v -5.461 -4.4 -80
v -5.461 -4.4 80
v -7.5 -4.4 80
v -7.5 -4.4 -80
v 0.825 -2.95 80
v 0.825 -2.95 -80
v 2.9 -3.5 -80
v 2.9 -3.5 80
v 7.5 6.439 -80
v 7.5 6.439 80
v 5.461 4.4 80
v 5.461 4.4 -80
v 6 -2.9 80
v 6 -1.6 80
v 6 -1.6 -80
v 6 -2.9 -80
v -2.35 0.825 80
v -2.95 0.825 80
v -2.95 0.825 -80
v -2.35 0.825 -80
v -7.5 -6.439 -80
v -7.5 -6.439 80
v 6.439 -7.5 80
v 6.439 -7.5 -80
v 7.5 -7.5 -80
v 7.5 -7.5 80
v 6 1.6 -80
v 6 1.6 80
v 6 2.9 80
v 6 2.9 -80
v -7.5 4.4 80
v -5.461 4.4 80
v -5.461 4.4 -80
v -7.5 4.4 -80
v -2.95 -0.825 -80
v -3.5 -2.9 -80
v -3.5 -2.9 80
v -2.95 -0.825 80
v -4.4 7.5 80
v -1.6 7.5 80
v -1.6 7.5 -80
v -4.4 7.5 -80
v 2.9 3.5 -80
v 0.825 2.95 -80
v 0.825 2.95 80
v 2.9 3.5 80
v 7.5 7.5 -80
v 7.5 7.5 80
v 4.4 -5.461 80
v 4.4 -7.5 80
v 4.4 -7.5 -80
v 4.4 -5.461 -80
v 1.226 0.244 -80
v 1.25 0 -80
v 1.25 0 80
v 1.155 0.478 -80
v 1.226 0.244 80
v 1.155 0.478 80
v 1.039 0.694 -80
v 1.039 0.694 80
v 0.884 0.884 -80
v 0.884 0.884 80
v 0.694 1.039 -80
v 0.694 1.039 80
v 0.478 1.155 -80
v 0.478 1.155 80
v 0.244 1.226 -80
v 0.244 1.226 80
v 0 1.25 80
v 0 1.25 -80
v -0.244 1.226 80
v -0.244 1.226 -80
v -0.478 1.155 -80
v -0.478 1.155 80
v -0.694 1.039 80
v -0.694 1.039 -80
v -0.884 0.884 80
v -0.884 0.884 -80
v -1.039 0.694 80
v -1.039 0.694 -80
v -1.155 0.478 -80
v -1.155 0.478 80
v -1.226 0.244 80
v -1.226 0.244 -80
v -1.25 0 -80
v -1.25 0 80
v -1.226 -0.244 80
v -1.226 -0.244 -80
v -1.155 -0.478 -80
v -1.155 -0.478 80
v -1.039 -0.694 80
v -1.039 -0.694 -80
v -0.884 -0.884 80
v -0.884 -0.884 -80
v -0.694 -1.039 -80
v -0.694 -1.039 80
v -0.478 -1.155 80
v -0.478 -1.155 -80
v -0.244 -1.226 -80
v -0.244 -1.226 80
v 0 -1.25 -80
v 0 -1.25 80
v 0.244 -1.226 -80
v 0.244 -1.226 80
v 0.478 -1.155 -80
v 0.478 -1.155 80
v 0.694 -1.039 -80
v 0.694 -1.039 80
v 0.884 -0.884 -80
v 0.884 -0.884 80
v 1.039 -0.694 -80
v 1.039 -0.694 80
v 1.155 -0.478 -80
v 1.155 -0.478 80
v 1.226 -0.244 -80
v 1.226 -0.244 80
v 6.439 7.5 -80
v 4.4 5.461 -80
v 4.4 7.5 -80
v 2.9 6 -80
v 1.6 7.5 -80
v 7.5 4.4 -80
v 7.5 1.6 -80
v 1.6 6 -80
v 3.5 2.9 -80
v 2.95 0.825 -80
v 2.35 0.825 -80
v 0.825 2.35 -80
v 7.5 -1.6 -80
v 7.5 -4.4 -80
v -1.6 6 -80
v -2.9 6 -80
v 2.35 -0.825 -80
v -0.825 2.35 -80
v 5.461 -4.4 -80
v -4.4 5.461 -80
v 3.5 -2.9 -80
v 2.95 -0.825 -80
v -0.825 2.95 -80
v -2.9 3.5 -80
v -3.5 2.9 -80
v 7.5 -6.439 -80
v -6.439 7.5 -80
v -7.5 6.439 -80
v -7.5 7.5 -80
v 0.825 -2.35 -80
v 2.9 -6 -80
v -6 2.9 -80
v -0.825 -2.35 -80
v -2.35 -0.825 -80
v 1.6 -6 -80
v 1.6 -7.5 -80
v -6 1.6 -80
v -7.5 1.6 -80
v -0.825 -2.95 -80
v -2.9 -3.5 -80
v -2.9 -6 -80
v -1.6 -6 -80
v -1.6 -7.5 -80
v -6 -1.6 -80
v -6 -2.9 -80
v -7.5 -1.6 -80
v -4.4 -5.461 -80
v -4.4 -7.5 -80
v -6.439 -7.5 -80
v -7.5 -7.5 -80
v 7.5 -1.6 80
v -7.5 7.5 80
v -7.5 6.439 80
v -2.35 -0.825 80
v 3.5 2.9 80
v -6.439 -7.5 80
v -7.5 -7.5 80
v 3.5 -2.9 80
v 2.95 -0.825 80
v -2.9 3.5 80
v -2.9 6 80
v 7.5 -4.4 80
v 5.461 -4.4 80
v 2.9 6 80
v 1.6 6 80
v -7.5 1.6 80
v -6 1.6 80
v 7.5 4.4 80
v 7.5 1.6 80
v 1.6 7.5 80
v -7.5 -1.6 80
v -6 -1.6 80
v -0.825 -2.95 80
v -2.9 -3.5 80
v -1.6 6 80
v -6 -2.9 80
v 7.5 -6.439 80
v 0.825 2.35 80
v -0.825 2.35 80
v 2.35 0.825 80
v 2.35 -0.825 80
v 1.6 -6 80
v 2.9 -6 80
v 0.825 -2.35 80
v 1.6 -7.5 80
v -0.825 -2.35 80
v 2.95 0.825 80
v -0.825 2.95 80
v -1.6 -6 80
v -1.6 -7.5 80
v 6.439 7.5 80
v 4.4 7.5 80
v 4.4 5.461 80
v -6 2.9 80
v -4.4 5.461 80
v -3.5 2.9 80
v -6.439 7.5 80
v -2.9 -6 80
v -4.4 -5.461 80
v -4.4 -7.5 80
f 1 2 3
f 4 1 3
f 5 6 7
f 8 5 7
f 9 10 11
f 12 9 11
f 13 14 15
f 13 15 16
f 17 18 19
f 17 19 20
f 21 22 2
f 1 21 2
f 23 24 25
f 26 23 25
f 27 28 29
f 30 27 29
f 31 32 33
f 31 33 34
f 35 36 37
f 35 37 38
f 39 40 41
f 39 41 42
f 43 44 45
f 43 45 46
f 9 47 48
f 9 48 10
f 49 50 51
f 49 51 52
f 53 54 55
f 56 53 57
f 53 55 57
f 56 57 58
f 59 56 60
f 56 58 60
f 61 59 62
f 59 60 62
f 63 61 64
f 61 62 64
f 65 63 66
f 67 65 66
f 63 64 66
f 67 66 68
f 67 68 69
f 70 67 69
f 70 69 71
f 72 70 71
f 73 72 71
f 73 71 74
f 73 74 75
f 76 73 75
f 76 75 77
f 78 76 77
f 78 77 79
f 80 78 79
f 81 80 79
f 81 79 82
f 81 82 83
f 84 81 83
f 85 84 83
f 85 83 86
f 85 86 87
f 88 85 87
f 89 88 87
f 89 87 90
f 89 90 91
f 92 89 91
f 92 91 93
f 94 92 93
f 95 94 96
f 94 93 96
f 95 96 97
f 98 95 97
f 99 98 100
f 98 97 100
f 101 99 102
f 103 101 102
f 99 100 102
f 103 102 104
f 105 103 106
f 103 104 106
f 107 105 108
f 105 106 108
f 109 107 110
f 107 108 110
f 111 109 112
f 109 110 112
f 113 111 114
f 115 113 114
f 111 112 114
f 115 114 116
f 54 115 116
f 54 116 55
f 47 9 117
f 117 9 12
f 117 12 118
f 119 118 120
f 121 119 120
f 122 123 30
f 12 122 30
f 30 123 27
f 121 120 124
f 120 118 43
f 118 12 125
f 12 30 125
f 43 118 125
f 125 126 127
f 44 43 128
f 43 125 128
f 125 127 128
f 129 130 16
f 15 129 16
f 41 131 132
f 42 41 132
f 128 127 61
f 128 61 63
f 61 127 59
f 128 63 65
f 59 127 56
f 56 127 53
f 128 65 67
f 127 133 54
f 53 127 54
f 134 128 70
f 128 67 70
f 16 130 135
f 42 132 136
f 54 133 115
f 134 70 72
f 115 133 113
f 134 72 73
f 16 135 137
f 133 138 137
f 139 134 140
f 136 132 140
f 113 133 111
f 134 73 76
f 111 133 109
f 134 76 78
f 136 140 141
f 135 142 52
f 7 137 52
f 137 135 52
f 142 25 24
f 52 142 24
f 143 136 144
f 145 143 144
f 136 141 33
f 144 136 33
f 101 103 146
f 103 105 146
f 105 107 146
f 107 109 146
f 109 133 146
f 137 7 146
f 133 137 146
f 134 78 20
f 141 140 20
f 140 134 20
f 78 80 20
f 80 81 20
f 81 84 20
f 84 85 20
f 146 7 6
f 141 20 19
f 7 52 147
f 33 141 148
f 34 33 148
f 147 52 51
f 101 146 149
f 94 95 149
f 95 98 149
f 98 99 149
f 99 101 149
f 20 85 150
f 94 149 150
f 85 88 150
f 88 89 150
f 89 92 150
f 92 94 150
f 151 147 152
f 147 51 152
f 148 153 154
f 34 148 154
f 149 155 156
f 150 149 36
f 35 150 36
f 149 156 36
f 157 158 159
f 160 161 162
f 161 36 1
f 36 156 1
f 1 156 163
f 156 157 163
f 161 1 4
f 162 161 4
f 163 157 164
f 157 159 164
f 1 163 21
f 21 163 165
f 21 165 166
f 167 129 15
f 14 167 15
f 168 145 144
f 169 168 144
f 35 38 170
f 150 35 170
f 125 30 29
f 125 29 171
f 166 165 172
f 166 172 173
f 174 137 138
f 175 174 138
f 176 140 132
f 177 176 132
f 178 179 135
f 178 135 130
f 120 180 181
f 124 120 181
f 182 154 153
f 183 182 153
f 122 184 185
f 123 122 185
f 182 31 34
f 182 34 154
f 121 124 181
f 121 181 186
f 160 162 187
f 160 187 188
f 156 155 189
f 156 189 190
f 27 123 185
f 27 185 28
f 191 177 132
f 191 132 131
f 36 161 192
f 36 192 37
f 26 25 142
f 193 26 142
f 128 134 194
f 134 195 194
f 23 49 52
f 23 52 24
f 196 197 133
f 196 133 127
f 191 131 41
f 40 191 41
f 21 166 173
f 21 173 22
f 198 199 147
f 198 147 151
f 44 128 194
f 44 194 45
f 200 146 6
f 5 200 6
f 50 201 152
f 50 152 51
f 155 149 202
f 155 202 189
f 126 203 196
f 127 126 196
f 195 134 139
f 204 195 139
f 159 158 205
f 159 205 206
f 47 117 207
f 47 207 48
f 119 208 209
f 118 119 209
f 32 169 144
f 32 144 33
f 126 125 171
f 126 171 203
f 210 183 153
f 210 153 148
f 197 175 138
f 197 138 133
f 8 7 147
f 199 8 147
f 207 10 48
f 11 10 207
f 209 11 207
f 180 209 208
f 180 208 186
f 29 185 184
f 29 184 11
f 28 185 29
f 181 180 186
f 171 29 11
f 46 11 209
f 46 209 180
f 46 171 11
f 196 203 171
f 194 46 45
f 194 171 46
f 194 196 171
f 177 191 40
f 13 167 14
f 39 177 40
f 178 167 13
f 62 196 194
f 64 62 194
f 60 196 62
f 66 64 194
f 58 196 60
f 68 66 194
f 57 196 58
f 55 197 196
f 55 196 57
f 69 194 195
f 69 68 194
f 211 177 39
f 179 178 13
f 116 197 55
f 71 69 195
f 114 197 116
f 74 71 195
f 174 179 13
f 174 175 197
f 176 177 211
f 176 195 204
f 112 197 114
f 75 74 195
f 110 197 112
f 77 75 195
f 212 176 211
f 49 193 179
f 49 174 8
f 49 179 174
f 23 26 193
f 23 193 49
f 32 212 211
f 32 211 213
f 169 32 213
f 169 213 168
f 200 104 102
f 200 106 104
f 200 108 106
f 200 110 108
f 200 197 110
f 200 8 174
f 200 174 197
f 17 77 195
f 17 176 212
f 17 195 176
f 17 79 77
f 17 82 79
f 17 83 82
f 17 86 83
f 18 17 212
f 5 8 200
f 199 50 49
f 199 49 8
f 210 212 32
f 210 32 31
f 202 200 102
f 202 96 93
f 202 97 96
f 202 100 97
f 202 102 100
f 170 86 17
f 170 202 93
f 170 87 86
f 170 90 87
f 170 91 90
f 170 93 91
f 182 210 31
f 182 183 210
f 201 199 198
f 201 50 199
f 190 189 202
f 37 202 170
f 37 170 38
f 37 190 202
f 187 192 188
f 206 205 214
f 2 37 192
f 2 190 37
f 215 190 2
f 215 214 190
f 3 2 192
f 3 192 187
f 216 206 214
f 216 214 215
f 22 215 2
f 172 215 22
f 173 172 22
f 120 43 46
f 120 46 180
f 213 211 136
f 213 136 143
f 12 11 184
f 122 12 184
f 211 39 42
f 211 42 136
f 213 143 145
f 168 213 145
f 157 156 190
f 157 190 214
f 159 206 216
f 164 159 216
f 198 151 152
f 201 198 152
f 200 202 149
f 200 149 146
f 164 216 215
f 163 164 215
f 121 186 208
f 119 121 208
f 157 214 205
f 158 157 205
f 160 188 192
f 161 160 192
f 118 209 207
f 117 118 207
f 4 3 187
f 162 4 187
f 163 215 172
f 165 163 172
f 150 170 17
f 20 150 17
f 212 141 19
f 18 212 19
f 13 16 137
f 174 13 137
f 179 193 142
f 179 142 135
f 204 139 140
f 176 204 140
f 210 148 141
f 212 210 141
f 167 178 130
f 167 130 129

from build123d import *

# Parameters (mm, degrees)
RESSALTO_EXTRUS_O1_DEPTH   = 80
ESPELHAR2_COPY_1_DEPTH     = 80
ESBO_O2_R                  = 1.25
CORTE_EXTRUS_O1_DEPTH      = 1
CORTE_EXTRUS_O1_DEPTH_BACK = 161


with BuildPart() as part:
    # Esboço1 → Ressalto-extrusão1 (new body, symmetric)
    with BuildSketch(Plane.XY):
        Polygon((0, 2.35), (-0.825, 2.35), (-0.825, 2.95), (-2.9, 3.5), (-2.9, 6), (-1.6, 6), (-1.6, 7.5), (-4.4, 7.5), (-4.4, 5.460660172), (-6.439339828, 7.5), (-7.5, 7.5), (-7.5, 6.439339828), (-5.460660172, 4.4), (-7.5, 4.4), (-7.5, 1.6), (-6, 1.6), (-6, 2.9), (-3.5, 2.9), (-2.95, 0.825), (-2.35, 0.825), (-2.35, 0), (0, 0), align=None)
    ressalto_extrus_o1 = extrude(amount=RESSALTO_EXTRUS_O1_DEPTH, both=True)

    # Espelhar1: Ressalto-extrusão1 across plane
    add(ressalto_extrus_o1.mirror(Plane.ZX))

    # Espelhar2: Ressalto-extrusão1 across plane
    add(ressalto_extrus_o1.mirror(Plane(origin=(0, 0, 0), x_dir=(0, 0, 1), z_dir=(1, 0, 0))))

    # Espelhar2 copy 1 sketch → Espelhar2 copy 1 (add, symmetric)
    with BuildSketch(Plane(origin=(0, 0, 0), x_dir=(-1, 0, 0), z_dir=(0, 0, 1))):
        Polygon((0, 2.35), (-0.825, 2.35), (-0.825, 2.95), (-2.9, 3.5), (-2.9, 6), (-1.6, 6), (-1.6, 7.5), (-4.4, 7.5), (-4.4, 5.460660172), (-6.439339828, 7.5), (-7.5, 7.5), (-7.5, 6.439339828), (-5.460660172, 4.4), (-7.5, 4.4), (-7.5, 1.6), (-6, 1.6), (-6, 2.9), (-3.5, 2.9), (-2.95, 0.825), (-2.35, 0.825), (-2.35, 0), (0, 0), align=None)
    extrude(amount=ESPELHAR2_COPY_1_DEPTH, both=True)

    # Esboço2 → Corte-extrusão1 (cut, two sides)
    with BuildSketch(Plane.XY.offset(80)) as corte_extrus_o1_sk:
        Circle(ESBO_O2_R)
    extrude(amount=CORTE_EXTRUS_O1_DEPTH, mode=Mode.SUBTRACT)
    extrude(corte_extrus_o1_sk.sketch, amount=-CORTE_EXTRUS_O1_DEPTH_BACK, mode=Mode.SUBTRACT)


solid = part.part
